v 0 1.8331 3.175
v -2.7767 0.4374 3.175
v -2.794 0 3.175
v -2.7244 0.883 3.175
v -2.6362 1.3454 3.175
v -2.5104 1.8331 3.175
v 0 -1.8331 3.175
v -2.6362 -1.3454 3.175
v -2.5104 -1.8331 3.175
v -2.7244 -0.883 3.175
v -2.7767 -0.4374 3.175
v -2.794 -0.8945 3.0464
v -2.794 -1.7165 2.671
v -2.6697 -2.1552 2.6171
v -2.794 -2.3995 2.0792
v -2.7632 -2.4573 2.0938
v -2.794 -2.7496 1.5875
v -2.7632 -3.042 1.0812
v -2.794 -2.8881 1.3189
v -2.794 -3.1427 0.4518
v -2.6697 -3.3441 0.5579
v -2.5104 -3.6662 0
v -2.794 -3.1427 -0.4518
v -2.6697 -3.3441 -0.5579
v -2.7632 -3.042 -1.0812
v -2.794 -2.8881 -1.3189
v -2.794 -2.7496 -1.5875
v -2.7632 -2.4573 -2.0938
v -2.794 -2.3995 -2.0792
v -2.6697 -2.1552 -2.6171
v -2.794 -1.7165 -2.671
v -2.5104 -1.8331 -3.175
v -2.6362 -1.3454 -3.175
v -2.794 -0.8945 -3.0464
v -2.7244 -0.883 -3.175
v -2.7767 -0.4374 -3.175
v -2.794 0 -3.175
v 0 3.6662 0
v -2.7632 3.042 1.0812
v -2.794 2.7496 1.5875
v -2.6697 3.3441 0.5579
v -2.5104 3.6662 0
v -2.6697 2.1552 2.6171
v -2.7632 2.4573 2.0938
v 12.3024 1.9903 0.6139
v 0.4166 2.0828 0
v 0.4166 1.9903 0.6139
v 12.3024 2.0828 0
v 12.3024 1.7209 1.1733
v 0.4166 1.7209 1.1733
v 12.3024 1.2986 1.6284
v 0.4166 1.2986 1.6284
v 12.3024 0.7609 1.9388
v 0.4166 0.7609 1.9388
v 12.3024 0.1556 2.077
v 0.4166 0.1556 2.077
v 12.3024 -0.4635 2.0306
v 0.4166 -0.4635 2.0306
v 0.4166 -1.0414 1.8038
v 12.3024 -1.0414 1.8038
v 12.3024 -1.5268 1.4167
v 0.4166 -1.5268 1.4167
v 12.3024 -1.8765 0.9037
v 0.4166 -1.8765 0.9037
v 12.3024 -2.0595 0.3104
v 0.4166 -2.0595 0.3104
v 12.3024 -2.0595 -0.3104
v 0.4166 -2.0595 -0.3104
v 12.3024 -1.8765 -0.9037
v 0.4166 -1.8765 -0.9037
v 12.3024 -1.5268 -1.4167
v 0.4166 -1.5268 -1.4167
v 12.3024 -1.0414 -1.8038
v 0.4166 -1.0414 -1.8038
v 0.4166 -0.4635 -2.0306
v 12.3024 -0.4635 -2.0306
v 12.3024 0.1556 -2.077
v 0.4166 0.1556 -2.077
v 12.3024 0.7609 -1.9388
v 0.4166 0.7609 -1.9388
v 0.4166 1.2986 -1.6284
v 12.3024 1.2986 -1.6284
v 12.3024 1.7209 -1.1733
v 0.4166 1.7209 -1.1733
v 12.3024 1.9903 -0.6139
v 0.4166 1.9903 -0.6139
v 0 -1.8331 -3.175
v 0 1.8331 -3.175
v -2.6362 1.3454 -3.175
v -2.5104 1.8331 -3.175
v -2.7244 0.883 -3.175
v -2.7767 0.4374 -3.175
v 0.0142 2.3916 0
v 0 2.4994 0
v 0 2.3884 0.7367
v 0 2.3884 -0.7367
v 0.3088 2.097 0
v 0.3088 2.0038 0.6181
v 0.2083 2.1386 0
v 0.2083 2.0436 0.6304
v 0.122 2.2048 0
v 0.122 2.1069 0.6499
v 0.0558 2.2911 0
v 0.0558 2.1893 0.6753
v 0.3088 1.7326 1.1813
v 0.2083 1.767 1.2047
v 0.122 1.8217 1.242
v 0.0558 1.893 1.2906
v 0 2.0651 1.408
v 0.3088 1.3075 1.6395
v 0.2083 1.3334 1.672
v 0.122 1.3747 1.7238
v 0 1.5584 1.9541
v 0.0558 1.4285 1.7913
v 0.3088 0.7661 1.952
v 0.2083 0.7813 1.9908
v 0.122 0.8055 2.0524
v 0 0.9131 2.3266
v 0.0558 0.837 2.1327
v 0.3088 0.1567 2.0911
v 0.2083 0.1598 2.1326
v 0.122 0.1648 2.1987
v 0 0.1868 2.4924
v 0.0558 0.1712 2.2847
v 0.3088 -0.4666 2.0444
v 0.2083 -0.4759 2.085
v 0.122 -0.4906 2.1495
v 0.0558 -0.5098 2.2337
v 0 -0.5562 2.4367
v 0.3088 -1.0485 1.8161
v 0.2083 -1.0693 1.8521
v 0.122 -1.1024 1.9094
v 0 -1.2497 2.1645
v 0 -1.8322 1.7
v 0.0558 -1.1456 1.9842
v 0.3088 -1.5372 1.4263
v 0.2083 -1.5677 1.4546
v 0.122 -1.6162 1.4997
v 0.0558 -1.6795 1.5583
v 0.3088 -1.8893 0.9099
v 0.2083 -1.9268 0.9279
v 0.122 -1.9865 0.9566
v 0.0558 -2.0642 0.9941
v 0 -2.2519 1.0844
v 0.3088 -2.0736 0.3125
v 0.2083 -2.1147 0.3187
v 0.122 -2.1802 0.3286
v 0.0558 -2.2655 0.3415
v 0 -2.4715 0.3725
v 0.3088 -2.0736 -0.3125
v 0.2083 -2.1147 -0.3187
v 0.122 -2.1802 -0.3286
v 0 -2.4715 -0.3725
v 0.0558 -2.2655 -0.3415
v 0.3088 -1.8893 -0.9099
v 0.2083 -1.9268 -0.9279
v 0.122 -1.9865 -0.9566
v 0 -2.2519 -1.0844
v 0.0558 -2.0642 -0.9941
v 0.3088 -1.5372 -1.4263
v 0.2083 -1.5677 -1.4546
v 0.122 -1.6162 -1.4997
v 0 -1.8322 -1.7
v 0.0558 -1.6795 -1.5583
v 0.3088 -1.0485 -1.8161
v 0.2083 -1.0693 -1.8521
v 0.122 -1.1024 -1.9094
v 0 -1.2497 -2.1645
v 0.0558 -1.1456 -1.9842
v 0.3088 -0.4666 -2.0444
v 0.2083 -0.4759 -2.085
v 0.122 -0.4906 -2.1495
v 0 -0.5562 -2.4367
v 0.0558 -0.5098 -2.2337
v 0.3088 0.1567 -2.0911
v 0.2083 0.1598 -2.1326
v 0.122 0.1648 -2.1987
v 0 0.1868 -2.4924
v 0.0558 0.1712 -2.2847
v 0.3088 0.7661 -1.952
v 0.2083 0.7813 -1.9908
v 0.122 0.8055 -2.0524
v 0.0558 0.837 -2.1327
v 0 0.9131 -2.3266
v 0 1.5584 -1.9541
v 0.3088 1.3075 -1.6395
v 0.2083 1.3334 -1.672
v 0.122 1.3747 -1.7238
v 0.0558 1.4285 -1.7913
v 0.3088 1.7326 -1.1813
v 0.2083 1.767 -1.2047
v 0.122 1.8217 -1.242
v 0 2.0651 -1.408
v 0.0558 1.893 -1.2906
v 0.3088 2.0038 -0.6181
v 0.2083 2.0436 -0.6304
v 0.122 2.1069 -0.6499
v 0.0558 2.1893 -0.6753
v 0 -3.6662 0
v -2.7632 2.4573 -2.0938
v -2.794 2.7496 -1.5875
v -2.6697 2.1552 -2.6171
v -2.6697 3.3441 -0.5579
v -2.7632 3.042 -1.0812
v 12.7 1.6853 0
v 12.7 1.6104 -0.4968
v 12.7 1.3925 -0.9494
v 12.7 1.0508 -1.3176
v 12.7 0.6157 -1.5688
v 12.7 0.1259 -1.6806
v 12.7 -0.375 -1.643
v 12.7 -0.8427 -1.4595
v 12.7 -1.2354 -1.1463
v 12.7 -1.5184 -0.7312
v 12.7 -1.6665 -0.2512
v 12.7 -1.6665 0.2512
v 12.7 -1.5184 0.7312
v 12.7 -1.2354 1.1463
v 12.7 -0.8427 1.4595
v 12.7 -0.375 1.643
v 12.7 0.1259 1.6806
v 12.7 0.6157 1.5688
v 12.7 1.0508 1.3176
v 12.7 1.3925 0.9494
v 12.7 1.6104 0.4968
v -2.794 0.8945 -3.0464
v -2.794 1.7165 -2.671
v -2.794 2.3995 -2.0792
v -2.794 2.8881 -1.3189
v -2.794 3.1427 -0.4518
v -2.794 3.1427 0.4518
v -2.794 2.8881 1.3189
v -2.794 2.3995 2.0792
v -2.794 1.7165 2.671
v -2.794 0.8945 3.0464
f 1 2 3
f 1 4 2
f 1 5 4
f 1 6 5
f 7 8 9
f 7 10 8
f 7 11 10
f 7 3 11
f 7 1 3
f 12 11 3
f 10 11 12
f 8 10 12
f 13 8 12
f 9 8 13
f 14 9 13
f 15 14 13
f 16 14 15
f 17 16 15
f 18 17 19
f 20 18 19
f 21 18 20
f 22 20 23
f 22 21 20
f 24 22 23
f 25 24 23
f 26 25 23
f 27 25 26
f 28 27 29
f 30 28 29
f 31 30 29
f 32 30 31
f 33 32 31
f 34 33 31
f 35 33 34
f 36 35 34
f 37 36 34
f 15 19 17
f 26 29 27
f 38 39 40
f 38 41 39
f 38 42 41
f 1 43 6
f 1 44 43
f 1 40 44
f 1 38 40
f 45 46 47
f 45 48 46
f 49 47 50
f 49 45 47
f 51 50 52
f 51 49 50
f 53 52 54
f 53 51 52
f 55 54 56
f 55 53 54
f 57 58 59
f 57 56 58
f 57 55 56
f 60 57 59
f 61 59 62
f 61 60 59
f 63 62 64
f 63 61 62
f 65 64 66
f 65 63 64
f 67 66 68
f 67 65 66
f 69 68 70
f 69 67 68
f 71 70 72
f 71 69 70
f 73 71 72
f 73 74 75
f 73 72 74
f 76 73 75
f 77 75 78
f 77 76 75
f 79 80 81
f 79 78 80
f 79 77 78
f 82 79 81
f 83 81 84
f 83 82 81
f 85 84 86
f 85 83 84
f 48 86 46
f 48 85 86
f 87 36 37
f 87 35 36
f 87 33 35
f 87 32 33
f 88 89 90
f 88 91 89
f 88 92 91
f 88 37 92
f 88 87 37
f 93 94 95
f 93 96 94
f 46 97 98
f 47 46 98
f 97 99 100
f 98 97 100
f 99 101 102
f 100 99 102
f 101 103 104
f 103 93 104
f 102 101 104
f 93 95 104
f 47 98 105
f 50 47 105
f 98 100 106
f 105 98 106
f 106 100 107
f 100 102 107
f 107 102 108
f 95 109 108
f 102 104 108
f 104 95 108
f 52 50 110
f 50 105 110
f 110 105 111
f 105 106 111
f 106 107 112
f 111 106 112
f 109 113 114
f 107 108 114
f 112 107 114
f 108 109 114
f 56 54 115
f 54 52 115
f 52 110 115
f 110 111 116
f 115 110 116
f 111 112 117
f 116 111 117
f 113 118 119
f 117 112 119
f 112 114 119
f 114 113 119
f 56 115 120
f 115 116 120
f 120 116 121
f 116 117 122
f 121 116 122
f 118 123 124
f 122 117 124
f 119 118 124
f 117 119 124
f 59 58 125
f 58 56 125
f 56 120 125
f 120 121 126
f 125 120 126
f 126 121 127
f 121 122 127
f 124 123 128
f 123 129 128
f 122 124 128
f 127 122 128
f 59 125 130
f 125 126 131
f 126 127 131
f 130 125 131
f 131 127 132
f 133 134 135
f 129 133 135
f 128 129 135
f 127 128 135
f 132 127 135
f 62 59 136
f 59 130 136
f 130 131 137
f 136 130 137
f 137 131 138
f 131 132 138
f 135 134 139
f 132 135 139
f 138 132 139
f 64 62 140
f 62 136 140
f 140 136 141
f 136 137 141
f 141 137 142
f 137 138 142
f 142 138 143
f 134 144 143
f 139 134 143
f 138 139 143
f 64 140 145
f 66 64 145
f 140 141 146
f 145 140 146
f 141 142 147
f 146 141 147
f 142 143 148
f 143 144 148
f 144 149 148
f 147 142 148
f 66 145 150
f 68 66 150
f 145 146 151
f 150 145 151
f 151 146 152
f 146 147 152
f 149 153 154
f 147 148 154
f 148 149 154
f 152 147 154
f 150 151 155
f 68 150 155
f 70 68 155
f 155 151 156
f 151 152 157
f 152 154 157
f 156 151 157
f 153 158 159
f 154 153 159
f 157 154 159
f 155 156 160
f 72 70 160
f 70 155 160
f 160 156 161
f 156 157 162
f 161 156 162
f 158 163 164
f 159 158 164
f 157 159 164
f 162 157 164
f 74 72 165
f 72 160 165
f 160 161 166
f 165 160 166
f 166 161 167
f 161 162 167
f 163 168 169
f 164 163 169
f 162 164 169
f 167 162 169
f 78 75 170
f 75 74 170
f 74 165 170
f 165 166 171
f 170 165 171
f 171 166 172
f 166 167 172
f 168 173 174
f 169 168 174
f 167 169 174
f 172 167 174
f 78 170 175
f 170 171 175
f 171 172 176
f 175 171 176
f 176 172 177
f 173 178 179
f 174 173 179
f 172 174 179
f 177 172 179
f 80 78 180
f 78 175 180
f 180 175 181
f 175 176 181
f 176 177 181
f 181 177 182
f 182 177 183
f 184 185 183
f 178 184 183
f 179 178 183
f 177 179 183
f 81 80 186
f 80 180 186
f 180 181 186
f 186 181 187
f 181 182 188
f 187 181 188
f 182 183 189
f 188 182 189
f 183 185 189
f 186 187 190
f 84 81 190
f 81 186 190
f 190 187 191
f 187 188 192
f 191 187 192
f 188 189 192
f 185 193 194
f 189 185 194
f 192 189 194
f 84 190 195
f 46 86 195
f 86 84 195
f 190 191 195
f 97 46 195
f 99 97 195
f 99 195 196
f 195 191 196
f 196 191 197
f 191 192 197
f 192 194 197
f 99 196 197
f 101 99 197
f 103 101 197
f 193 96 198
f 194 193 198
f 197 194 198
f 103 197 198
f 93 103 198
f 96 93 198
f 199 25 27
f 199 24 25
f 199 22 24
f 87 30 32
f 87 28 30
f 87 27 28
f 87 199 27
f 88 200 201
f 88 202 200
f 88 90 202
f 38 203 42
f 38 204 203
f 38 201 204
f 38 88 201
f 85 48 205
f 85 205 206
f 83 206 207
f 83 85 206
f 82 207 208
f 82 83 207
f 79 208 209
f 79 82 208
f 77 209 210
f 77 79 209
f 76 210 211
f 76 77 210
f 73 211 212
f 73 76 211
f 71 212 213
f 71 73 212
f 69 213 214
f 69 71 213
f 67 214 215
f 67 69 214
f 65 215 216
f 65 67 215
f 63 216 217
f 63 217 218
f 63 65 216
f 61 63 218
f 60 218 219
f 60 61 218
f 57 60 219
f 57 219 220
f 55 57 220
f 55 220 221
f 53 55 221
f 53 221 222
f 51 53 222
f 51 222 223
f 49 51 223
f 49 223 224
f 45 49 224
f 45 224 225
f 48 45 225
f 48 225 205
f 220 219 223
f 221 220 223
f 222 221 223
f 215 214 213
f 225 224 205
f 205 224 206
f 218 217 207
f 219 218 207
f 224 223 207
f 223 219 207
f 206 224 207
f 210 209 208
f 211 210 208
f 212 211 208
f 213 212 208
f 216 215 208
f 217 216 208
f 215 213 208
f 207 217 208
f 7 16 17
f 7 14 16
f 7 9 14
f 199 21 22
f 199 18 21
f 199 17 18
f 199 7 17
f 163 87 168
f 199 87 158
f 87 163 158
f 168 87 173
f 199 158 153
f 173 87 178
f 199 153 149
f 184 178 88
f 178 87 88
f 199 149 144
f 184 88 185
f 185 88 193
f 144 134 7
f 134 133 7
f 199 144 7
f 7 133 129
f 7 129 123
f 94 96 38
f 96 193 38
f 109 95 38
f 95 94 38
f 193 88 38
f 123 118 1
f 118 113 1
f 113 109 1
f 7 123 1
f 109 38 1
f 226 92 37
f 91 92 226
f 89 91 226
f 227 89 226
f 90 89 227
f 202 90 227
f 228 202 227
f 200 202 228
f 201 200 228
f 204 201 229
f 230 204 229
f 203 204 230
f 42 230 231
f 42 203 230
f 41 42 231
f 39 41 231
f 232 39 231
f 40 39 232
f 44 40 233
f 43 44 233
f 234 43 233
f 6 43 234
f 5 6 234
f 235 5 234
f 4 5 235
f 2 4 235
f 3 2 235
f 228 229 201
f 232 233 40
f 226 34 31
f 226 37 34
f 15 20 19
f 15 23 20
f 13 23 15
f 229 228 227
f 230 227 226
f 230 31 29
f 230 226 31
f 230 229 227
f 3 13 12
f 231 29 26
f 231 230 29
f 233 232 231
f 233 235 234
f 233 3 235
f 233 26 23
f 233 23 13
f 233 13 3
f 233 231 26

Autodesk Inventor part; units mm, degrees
ref_plane "YZ Plane" through (0, 0, 0) normal (1, 0, 0) x (0, 1, 0)
ref_plane "XZ Plane" through (0, 0, 0) normal (0, 1, 0) x (-1, 0, 0)
sketch "Sketch1" plane through (0, 0, 0) normal (0, 0, 1) x (1, 0, 0)
  line L0 (0, 2.0828) -> (12.7, 2.0828)
  line L1 (12.7, 2.0828) -> (12.7, 0)
  line L2 (12.7, 0) -> (0, 0)
  line L3 (-2.54, 0) -> (15.24, 0) projected
  line L4 (0, -0.4166) -> (0, 2.4994) projected
  line L5 (0, 2.0828) -> (0, 0)
  dimension "d2" = 4.1656
  dimension "d59" = 12.7
revolve "Body" add sketch "Sketch1" angle 360 about axis through (12.7, 0, 0) along (-1, 0, 0)
sketch "Sketch2" plane through (0, 0, 0) normal (-1, 0, 0) x (0, 0, 1)
  line L0 (0, 3.6662) -> (3.175, 1.8331)
  line L1 (3.175, 1.8331) -> (3.175, -1.8331)
  line L2 (3.175, -1.8331) -> (0, -3.6662)
  line L3 (0, -3.6662) -> (-3.175, -1.8331)
  line L4 (-3.175, -1.8331) -> (-3.175, 1.8331)
  line L5 (-3.175, 1.8331) -> (0, 3.6662)
  line L6 (-4.445, 0) -> (4.445, 0) projected
  line L7 (0, 5.1326) -> (0, -5.1326) projected
  point P0 (0, 0)
  point P1 (0, 0)
  dimension "d11" = 6.35
extrude "Head" add sketch "Sketch2" along normal blind 2.794
sketch "Sketch4" plane through (0, 0, 0) normal (0, 0, 1) x (1, 0, 0)
  line L0 (-2.4274, 3.81) -> (-2.794, 3.175)
  line L1 (-1.1, 0) -> (-0.234, 0)
  line L2 (-3.306, 0) -> (0.278, 0) projected
  line L3 (-2.794, 3.81) -> (-2.4274, 3.81)
  line L4 (-2.794, 3.175) -> (-2.794, 3.81)
  line L5 (0, 4.572) -> (0, -0.762) projected
  dimension "d65" = 6.35
  dimension "d67" = 30
  dimension "d68" = 7.62
  dimension "d69" = 2.794
revolve "Chamfer1" cut sketch "Sketch4" angle 360 about axis through (-1.1, 0, 0) along (1, 0, 0)
thread "Thread" size "8-32 UNC" class "2A" standard "ANSI Unified Screw Threads" length 31.2623
chamfer "Chamfer2" distance 0.3975 distance2 0.3976 1 edges at (12.7, -2.0828, 0) measured on face at (12.7, 0.4208, -1.1095)
fillet "Fillet" radius 0.4166 1 edges at (0, -2.0828, 0)
ref_plane "Work Plane1" through (1.525, 0, 0) normal (0, 0, 1) x (1, 0, 0)
equation "\"d2\" = GD"
equation "\"d11\" = SW"
equation "\"d3\" = KOH"
equation "\"d15\" = GEL"
equation "\"d6\" = -0.5 * SPD + 0.5 * GD"
equation "\"d71\" = RR"
equation "\"d65\" = SW"
equation "\"d67\" = ANG1"
equation "\"d68\" = 1.2 * SW"
equation "\"d69\" = KOH"
equation "\"NLG\" = 31.75"
equation "\"GD\" = NND"
equation "\"BDM\" = NND"
equation "\"KOH\" = 2.794"
equation "\"GEL\" = 31.26232"
equation "\"SW\" = 6.35"
equation "\"SW0\" = SW"
equation "\"SPD\" = GD1"
equation "\"SD2\" = NND"
equation "\"SD\" = 0"
equation "\"ANG1\" = 30deg"
equation "\"GAL\" = 0.39751"
equation "\"GUL\" = GAL"
equation "\"RR\" = 0.41656"
equation "\"RR1\" = 0.1"
equation "\"GD1\" = 3.37058"
equation "\"THREADDIA\" = 4.1656"
equation "\"TOA\" = 30deg"
equation "\"NND\" = 4.1656"
equation "\"E0\" = 1.155 * SW"
properties part number "ANSI B18.6.3 - No. 8 - 32 - 1 1/4" material "Steel, Mild"
